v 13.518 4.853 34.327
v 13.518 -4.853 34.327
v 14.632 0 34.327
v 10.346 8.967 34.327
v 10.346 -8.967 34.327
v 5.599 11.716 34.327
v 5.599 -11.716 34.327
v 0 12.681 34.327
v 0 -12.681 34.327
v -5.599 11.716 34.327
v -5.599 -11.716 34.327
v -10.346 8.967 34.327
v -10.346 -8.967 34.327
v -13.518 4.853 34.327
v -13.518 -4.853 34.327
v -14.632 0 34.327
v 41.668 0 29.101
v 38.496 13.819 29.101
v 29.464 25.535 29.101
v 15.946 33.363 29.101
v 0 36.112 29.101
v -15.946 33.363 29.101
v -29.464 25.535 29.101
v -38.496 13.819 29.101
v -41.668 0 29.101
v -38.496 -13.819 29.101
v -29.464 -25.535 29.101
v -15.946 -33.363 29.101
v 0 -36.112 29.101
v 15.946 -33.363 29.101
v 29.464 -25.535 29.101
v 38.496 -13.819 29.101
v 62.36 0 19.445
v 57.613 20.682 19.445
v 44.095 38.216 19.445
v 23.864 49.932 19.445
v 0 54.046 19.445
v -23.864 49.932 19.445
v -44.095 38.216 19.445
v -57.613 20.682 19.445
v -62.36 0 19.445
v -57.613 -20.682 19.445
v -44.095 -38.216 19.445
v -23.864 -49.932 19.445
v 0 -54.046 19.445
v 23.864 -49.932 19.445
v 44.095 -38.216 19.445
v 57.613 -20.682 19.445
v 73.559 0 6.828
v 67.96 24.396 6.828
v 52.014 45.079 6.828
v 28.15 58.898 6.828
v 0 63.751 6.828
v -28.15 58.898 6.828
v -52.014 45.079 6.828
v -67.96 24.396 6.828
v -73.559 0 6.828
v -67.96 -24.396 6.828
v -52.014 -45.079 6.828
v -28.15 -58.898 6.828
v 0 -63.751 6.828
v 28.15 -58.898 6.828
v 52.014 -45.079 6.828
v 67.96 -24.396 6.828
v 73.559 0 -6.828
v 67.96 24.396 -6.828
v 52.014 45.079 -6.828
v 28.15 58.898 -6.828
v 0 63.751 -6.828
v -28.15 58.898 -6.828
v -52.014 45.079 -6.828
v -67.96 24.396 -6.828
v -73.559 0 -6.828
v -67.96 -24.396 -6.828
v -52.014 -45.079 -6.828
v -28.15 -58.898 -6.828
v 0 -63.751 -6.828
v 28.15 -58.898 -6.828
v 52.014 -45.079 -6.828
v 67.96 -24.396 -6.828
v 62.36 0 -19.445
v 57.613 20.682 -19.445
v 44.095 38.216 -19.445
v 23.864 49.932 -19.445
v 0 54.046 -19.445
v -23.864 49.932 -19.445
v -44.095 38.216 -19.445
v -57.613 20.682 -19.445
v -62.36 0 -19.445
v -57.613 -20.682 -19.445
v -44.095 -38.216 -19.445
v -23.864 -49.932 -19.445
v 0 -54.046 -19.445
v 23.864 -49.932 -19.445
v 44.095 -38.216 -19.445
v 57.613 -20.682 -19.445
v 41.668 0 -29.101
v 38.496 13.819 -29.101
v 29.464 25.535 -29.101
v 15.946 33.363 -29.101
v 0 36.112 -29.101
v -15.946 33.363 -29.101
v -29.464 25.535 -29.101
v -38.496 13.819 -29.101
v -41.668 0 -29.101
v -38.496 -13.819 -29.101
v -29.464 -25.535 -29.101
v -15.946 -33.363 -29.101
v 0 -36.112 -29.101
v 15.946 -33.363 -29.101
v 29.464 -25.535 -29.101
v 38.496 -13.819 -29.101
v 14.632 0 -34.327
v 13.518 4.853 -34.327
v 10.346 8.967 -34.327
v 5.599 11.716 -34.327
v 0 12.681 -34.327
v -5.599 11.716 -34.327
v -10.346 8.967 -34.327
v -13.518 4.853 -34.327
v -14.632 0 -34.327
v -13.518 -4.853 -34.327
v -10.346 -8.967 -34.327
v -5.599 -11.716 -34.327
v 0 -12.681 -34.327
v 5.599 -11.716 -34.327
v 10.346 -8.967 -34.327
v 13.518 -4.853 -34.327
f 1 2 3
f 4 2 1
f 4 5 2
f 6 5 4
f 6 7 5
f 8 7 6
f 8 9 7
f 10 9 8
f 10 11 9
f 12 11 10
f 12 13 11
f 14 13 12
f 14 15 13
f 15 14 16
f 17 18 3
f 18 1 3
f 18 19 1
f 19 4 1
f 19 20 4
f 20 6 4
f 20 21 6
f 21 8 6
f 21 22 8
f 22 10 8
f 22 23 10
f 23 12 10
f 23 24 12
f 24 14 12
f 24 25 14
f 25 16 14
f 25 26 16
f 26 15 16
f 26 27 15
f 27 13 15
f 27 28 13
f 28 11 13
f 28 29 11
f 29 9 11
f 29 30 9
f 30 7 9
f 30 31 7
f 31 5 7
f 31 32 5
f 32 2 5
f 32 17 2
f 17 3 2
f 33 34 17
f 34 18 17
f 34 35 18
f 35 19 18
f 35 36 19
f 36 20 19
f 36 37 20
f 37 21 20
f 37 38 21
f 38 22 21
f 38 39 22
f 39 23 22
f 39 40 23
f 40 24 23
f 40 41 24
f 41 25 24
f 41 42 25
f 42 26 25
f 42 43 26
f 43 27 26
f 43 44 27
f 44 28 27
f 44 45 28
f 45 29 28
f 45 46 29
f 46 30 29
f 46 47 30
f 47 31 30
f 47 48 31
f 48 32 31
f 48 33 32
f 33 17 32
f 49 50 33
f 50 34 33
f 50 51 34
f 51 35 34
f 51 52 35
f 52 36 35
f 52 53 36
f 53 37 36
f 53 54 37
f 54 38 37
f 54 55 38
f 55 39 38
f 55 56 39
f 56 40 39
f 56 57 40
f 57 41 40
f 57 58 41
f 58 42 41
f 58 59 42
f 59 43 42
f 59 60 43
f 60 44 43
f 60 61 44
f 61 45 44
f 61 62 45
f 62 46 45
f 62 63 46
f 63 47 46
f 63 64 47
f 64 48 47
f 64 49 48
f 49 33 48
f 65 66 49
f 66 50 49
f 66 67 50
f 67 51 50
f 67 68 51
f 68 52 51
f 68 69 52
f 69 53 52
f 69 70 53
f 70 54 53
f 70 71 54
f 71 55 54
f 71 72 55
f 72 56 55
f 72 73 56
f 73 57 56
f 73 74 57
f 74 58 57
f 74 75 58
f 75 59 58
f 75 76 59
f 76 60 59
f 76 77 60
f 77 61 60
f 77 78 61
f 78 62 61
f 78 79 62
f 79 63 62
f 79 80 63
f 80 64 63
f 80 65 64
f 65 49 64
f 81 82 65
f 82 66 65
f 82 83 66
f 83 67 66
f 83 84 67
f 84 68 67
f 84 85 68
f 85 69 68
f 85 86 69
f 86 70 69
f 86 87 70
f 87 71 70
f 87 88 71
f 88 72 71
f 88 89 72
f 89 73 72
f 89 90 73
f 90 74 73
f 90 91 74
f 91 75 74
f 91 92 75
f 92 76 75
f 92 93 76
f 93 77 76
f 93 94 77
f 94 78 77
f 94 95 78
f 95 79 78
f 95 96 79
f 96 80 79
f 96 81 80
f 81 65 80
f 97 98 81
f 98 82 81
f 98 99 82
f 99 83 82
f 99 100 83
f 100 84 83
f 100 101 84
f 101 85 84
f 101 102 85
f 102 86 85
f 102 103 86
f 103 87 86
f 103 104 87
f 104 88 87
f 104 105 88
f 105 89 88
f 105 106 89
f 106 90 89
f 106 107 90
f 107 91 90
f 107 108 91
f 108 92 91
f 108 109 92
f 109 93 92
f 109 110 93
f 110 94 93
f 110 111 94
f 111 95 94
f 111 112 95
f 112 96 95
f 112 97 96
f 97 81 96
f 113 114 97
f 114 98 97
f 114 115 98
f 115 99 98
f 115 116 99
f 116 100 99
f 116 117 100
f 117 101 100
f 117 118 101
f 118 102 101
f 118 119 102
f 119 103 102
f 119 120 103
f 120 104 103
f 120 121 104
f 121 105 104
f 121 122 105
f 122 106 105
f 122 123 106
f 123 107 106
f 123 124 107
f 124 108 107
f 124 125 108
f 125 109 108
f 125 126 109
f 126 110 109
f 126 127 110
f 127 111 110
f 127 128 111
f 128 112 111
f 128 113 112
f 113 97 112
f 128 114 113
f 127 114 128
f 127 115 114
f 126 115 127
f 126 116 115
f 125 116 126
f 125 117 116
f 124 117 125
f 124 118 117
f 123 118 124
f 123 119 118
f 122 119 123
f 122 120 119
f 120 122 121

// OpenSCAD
// Generated by SolidPython 1.0.1 on 2020-07-29 00:46:52


scale(v = [15, 13, 7]) {
	sphere(r = 5);
}
/***********************************************
*********      SolidPython code:      **********
************************************************
 
# import packages: SolidPython
from solid import *
from solid.utils import *
from itertools import chain, combinations, permutations


class Resize:

    def __init__(self, scad_file):
        self.scad_file = scad_file
        #self.scad_file = import_scad(scad_file)
        # cone/cylinder param:
        self.r1 = 0
        self.r2 = 0
        self.h = 0
        # rectangular prism param:
        self.w = 0
        self.l = 0
        # ellipse param:
        self.r = 0

    # import OpenScad code (file name corresponds to shape)


    # classify shape + parameters
    def assign(self, param1, param2, param3):
        if self.scad_file == 'cone.scad':
            self.r1 = param1
            self.r2 = param2
            self.h = param3
        elif self.scad_file == 'cylinder.scad':
            self.r1 = param1
            self.r2 = param2
            self.h = param3
        elif self.scad_file == 'rectangularPrism.scad':
            self.h = param1
            self.l = param2
            self.w = param3
        else:
            self.r = param1
            self.h = param2

    # resize parameters
    def iterate(self):
        x = range(3, 20, 2)
        i = 1
        if self.scad_file == 'cone.scad':
            tempList = list(permutations(x, 2))
            for temp in tempList:
                param1 = temp[0]
                param2 = temp[1]
                filepath = 'produced_scad_files/' + 'cone' + str(param1) + '_' + str(param2) + '_' + '.scad'
                scad_render_to_file(cylinder(h=param1, r1=param2, r2=0), filepath)

        elif self.scad_file == 'cylinder.scad':
            tempList = list(permutations(x, 3))
            for temp in tempList:
                param1 = temp[0]
                param2 = temp[1]
                filepath = 'produced_scad_files/' + 'cylinder' + str(param1) + '_' + str(param2) + '_' + '.scad'
                scad_render_to_file(cylinder(h=param1, r1=param2, r2=param2), filepath)

        elif self.scad_file == 'rectangularPrism.scad':
            tempList = list(permutations(x, 3))
            for temp in tempList:
                param1 = temp[0]
                param2 = temp[1]
                param3 = temp[2]
                filepath = 'produced_scad_files/' + 'rectangularPrism' + str(param1) + '_' + str(param2) + '_' + str(
                    param3) + '.scad'
                scad_render_to_file(cube(size=(param1, param2, param3)), filepath)

        elif self.scad_file == 'ellipse.scad':
            tempList = list(permutations(x, 4))
            for temp in tempList:
                param1 = temp[0]
                param2 = temp[1]
                param3 = temp[2]
                param4 = temp[3]
                filepath = 'produced_scad_files/' + 'ellipse' + str(param1) + '_' + str(param2) + '_' + str(param3) + '_' + str(param4) + '.scad'
                scad_render_to_file(scale([param1, param2, param3])(sphere(r=param4)), filepath)

    def render_to_scadfile(self):
        scad_render_to_file(scad, 'example.scad') 
 
************************************************/
